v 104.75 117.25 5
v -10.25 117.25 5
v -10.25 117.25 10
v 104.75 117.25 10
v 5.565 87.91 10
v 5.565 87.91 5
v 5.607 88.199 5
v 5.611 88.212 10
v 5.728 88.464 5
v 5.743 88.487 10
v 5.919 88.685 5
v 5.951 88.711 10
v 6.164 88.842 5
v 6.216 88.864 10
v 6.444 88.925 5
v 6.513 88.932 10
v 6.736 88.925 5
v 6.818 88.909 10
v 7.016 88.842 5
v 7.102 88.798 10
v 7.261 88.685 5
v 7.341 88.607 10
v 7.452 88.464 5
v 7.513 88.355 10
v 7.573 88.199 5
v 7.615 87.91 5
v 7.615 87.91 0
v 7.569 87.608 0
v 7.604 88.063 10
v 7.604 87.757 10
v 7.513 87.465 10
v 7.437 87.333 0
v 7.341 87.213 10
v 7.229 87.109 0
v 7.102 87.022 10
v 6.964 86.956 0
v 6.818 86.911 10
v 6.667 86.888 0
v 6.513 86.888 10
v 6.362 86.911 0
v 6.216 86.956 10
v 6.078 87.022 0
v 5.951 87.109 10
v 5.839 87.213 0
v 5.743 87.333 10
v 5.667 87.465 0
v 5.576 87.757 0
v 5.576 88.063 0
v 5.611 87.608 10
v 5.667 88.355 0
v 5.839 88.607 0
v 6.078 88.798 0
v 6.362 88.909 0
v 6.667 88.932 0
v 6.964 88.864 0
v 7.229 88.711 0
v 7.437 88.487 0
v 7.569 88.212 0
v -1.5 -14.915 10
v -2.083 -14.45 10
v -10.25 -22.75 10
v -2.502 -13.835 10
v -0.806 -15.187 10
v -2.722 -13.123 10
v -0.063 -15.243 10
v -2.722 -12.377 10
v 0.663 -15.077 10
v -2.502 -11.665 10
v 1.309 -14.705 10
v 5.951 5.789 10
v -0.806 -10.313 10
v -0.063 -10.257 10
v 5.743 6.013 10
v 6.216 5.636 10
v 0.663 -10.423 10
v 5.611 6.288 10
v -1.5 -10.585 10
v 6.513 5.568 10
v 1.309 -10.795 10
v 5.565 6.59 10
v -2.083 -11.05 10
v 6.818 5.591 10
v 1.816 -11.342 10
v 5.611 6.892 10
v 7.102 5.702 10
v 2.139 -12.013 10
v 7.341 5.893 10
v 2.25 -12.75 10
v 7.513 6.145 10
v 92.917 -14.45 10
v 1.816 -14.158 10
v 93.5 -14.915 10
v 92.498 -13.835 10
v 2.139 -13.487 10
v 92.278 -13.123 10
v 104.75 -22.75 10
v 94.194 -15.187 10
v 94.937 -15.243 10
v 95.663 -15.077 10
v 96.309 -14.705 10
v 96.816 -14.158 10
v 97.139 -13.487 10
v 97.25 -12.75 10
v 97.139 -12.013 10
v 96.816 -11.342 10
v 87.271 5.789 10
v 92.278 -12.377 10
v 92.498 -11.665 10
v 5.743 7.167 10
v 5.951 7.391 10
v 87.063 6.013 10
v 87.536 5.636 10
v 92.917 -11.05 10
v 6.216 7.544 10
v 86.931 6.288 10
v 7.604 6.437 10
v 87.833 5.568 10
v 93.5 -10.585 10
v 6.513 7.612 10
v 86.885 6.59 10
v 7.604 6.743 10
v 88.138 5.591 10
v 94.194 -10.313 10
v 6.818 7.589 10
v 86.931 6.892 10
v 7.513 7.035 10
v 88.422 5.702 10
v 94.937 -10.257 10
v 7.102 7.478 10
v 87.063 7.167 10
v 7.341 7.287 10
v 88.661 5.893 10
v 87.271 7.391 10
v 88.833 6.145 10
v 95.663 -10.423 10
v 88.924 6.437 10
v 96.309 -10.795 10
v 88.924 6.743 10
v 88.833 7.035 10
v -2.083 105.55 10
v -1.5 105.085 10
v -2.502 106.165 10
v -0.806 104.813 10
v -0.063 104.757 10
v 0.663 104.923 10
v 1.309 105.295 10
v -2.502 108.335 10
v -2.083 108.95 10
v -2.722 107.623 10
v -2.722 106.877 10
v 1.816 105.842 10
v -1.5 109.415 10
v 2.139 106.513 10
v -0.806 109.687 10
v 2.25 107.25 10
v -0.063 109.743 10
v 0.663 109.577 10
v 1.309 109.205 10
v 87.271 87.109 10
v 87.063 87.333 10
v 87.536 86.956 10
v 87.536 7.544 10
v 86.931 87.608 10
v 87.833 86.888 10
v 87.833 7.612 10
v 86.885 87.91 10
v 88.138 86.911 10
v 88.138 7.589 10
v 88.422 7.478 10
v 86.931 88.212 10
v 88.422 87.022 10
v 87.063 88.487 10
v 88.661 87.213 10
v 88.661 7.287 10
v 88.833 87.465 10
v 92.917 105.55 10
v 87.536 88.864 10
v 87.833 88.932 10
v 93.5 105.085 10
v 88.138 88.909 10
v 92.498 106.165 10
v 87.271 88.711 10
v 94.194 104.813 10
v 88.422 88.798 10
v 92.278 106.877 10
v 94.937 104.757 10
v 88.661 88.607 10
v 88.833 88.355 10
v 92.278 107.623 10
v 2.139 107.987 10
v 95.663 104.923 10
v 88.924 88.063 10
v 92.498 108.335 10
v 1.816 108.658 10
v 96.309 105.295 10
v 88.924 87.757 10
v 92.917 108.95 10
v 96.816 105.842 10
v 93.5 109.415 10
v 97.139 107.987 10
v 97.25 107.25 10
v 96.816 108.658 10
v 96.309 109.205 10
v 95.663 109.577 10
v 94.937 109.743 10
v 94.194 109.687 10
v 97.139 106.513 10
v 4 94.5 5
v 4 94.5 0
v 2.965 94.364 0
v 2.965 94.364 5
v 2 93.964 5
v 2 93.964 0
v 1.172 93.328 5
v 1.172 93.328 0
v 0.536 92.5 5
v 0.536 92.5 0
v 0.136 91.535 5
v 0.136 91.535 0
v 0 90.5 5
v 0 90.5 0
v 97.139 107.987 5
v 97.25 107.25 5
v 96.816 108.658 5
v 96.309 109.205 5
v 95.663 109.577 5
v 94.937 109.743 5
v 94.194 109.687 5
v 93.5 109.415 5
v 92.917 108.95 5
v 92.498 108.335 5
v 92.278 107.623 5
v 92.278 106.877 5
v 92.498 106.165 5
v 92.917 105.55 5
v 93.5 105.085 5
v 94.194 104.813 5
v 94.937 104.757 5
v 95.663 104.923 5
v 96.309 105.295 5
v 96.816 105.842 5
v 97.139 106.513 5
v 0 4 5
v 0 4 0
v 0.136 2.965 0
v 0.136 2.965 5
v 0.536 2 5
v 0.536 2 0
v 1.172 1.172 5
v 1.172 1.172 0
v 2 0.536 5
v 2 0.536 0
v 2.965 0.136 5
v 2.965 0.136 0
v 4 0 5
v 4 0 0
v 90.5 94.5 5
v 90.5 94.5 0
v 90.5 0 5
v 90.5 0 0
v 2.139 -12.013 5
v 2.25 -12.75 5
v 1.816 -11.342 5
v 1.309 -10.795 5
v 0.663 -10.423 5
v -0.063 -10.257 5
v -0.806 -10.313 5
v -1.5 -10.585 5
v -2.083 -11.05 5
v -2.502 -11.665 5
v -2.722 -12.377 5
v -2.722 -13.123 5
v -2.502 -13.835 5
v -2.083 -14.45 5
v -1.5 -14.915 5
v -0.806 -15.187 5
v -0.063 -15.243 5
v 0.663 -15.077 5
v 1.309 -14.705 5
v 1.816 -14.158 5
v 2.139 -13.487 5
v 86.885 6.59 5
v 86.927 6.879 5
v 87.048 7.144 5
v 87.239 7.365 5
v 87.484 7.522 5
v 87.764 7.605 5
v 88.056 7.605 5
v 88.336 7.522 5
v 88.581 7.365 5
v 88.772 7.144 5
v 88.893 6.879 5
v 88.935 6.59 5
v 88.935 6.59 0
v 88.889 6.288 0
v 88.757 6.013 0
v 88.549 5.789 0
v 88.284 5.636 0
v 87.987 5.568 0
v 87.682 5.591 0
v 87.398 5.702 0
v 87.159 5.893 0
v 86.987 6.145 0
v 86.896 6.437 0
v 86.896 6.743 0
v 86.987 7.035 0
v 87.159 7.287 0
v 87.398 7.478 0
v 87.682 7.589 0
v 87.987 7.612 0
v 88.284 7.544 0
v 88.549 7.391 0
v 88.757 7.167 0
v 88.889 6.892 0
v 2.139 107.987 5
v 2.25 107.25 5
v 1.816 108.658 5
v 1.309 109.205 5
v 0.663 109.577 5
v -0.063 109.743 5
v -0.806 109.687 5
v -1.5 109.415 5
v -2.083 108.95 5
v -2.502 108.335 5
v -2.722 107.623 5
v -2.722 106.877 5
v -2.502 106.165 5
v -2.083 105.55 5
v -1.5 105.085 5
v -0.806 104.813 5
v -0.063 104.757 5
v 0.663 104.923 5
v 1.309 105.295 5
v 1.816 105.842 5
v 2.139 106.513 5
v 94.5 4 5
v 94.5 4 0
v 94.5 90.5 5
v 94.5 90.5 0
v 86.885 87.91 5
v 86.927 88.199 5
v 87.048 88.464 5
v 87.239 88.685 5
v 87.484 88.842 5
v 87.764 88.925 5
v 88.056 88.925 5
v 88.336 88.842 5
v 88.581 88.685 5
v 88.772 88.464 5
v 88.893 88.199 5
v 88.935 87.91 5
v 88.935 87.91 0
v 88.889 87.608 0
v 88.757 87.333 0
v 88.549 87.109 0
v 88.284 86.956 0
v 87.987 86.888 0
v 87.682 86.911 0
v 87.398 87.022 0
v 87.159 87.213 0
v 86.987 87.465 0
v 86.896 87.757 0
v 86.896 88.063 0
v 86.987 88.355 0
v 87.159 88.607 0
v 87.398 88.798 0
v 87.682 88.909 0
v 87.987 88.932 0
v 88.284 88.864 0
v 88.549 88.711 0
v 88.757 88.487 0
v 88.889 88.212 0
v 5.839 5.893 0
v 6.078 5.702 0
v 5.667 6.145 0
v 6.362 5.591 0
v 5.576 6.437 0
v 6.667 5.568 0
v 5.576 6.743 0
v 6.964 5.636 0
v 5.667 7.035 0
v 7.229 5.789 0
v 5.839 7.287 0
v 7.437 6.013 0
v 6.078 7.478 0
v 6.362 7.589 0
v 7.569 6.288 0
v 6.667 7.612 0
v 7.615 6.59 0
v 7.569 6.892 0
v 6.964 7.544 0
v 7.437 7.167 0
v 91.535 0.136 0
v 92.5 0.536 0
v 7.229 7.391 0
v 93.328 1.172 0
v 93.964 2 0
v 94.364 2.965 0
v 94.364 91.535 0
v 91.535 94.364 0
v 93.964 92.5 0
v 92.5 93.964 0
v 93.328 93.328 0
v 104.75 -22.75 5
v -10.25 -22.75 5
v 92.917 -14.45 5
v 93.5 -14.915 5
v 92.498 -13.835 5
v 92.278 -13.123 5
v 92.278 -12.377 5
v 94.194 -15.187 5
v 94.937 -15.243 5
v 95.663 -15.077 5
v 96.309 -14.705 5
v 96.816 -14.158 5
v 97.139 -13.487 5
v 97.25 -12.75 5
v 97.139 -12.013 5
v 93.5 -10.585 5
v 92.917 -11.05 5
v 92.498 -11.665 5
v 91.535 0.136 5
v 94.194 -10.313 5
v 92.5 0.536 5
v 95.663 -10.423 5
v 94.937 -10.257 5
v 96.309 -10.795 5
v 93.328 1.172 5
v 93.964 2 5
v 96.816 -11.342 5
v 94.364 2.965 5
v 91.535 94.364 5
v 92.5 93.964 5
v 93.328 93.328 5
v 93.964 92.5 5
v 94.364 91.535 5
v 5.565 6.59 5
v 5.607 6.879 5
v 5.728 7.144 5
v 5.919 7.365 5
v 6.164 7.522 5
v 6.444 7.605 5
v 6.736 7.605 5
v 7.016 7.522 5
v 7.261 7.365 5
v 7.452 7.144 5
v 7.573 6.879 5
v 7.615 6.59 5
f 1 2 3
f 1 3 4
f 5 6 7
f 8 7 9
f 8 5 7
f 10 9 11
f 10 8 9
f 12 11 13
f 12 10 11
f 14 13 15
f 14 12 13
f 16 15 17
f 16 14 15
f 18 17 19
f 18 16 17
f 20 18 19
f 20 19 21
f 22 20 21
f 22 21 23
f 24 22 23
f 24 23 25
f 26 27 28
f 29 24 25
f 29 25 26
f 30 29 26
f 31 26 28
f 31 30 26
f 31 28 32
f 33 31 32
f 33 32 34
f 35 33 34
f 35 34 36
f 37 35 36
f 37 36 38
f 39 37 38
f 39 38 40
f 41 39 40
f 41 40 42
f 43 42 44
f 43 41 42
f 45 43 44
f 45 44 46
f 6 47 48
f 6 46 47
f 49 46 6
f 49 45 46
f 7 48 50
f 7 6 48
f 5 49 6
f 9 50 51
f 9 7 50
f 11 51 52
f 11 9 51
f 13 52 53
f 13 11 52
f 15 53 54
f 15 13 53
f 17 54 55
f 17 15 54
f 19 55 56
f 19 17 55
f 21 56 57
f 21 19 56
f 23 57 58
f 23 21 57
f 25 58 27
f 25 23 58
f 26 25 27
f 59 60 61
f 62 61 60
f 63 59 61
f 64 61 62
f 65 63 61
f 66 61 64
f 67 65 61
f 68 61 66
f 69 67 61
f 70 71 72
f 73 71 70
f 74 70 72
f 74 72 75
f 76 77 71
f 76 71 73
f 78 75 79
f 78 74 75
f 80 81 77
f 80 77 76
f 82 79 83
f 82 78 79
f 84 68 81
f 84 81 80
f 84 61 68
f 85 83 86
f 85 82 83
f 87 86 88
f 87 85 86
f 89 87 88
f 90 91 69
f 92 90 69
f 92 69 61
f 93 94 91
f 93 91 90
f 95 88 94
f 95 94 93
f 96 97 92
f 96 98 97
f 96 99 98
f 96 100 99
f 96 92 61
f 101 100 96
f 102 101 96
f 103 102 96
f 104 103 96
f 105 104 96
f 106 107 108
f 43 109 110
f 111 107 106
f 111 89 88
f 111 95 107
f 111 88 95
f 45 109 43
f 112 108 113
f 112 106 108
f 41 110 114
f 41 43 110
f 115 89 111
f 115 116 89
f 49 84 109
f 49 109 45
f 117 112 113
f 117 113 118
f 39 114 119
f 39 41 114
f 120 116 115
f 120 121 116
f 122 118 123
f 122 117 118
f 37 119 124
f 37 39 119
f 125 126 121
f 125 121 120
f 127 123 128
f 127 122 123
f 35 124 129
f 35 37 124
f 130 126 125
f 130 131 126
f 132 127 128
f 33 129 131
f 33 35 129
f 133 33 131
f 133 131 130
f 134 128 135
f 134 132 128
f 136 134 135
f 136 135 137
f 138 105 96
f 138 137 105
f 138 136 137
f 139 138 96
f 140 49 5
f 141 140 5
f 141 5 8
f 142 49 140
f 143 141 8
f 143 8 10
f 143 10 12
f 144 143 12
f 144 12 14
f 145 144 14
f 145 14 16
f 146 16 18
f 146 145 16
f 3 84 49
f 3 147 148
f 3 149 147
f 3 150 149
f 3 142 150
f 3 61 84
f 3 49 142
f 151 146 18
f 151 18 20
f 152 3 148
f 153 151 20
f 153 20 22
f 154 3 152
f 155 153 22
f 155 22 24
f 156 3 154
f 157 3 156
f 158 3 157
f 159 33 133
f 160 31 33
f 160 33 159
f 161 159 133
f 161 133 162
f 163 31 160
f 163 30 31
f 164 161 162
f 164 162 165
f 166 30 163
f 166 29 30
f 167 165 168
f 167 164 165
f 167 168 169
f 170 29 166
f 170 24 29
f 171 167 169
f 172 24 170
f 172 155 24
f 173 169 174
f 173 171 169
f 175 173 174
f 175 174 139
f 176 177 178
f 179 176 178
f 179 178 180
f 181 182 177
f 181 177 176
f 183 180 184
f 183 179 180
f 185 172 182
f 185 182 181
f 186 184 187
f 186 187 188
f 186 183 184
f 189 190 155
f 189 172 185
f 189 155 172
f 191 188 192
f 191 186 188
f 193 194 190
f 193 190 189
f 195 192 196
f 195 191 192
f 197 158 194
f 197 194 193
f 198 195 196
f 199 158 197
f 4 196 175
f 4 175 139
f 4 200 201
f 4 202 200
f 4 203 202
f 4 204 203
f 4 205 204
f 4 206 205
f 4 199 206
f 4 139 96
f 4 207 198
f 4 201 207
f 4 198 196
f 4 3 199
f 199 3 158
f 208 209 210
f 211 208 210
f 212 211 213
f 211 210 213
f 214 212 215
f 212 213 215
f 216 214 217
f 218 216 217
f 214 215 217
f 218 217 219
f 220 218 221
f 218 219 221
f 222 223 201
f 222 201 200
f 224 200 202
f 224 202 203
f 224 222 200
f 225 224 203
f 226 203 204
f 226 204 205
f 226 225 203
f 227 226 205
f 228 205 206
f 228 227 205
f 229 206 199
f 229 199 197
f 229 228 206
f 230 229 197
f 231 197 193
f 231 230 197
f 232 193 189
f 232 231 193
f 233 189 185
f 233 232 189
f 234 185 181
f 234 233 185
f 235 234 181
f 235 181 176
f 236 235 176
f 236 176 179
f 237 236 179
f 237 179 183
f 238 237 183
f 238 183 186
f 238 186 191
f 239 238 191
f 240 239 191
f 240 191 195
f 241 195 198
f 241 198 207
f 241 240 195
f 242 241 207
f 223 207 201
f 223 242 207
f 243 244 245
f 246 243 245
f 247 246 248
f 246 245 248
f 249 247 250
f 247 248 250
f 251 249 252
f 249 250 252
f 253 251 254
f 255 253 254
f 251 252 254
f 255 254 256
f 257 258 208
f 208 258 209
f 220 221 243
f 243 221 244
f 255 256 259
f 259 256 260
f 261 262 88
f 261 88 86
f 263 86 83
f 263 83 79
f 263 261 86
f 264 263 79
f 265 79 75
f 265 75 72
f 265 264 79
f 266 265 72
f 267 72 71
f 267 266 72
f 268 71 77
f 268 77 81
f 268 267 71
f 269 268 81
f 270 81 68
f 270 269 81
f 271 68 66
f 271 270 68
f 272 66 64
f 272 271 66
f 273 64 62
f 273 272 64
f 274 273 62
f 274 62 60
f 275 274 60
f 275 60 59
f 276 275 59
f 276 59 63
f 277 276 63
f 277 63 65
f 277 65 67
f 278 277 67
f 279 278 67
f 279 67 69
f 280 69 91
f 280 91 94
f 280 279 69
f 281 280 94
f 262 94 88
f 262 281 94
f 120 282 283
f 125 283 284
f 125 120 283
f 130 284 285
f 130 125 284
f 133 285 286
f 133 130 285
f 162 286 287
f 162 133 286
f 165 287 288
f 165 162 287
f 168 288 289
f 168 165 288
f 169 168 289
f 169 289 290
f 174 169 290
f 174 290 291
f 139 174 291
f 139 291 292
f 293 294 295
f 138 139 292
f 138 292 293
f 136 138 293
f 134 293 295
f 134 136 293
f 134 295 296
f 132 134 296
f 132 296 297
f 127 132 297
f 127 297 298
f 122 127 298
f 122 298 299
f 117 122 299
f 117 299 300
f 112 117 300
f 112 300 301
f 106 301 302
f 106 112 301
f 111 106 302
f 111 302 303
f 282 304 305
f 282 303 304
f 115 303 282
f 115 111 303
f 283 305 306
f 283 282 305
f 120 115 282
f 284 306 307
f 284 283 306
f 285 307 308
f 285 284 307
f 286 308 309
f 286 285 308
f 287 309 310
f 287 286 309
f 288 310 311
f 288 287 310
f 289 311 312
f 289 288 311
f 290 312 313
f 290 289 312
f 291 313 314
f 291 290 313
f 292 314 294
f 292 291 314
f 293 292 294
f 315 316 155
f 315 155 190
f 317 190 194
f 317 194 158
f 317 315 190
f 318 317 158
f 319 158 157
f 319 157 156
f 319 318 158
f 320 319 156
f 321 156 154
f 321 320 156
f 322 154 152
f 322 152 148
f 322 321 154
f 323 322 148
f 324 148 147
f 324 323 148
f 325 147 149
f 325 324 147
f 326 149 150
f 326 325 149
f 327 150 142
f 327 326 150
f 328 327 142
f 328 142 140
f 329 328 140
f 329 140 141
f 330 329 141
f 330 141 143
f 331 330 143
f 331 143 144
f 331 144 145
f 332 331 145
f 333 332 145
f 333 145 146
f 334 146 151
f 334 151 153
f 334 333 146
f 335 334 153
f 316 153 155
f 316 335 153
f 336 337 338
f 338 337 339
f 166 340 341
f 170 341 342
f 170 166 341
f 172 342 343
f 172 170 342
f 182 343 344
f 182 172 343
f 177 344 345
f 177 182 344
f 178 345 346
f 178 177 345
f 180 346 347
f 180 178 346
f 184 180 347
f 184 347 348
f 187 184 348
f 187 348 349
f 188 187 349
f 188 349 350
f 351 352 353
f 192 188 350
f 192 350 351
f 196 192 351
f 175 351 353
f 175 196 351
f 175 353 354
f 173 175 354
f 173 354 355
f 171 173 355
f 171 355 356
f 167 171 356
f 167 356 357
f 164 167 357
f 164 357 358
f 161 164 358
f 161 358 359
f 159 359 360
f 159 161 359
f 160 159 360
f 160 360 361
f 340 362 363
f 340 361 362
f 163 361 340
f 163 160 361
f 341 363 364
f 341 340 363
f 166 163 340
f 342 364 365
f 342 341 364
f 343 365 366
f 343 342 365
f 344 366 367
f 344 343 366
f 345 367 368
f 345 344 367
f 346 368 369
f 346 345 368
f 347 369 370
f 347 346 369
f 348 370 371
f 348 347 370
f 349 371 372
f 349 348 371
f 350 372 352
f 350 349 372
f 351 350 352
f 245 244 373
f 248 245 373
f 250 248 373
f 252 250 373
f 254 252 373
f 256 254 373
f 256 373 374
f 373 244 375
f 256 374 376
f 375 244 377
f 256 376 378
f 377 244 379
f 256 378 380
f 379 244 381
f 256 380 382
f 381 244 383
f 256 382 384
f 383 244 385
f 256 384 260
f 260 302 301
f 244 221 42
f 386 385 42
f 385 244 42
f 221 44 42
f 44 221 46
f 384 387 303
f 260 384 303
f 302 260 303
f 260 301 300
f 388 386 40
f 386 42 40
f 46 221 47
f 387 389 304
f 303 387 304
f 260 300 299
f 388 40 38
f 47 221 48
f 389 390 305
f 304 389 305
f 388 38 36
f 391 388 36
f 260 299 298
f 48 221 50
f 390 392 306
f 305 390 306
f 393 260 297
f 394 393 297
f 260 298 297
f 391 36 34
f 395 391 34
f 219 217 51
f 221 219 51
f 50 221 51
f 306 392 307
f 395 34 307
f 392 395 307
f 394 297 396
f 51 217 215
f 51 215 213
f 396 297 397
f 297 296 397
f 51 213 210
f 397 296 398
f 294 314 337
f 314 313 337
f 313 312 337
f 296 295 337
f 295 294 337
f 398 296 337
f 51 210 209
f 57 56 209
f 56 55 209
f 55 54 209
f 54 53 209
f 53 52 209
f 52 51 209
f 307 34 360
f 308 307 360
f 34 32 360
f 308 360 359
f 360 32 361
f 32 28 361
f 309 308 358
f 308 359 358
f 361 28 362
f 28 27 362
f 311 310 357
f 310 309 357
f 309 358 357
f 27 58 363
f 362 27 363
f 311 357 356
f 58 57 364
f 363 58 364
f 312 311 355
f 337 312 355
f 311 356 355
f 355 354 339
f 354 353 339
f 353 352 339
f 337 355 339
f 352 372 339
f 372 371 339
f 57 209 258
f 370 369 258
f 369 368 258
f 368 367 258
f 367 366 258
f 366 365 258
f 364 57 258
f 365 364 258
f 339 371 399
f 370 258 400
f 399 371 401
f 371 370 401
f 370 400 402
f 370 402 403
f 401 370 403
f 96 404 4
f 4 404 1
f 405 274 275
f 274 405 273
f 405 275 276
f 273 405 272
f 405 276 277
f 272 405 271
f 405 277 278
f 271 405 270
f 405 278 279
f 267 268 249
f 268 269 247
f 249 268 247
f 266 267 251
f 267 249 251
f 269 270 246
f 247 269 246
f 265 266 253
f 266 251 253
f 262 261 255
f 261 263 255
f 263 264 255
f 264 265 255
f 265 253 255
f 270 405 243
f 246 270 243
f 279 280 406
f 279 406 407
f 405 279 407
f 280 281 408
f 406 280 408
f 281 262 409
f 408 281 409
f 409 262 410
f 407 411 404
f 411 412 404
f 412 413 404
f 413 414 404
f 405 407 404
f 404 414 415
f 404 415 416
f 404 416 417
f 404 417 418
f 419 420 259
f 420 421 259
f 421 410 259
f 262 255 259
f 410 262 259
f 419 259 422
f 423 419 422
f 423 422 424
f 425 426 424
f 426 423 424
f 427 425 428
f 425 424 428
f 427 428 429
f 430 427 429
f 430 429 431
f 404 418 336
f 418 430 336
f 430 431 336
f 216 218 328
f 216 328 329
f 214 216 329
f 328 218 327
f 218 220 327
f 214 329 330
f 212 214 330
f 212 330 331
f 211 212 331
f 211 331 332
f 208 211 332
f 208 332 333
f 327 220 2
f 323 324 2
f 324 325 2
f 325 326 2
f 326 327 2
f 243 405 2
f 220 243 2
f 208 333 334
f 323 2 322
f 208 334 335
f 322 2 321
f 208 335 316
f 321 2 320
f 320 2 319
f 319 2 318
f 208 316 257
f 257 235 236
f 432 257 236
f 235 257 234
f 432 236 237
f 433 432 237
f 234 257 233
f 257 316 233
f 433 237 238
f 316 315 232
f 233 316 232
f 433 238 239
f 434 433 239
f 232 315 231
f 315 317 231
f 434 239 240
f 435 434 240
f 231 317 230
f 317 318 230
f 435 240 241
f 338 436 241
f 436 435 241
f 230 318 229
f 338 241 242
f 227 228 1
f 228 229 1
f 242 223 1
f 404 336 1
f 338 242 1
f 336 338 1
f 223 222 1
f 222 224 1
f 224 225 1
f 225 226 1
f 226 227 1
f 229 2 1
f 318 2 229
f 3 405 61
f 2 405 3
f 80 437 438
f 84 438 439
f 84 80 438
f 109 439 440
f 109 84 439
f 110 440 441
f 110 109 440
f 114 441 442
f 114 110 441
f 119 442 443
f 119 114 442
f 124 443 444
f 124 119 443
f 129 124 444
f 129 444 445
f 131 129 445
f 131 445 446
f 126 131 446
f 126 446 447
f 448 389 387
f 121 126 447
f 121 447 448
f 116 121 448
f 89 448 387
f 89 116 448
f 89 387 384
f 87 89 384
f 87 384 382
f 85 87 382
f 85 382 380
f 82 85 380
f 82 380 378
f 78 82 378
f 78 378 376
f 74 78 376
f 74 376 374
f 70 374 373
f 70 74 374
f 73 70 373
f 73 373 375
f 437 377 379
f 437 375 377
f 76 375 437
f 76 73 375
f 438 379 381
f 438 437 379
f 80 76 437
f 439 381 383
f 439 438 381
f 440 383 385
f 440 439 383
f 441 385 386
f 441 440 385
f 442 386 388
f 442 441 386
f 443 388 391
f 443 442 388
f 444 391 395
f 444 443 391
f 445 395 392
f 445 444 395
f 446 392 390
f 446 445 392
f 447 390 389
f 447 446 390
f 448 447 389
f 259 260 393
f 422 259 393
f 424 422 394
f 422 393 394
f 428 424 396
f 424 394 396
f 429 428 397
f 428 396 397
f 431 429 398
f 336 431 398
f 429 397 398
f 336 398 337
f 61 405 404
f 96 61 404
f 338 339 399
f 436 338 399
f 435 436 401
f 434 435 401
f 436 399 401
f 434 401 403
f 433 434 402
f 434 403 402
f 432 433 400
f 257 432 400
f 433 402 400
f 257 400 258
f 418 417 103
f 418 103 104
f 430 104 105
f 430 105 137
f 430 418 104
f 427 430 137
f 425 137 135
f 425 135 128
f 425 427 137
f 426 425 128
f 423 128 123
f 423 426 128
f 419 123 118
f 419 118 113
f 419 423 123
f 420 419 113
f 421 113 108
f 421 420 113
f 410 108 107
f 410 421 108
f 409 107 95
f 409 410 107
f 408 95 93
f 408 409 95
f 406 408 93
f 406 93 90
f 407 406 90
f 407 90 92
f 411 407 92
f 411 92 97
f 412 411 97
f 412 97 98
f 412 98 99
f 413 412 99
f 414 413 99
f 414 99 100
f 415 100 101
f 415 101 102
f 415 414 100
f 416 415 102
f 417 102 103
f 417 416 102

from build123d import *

# Parameters (mm, degrees)
SKETCH1_R           = 1.025
BOSS_EXTRUDE1_DEPTH = 5
SKETCH2_W           = 115
SKETCH2_H           = 140
SKETCH2_R           = 2.5
BOSS_EXTRUDE2_DEPTH = 5
CUT_EXTRUDE1_START  = -10
SKETCH3_R           = 1.025
CUT_EXTRUDE1_DEPTH  = 5


with BuildPart() as part:
    # Sketch1 → Boss-Extrude1 (new body)
    with BuildSketch(Plane.XY):
        with BuildLine():
            Line((4, 0), (90.5, 0))
            ThreePointArc((90.5, 0), (93.328427125, 1.171572875), (94.5, 4))
            Line((94.5, 4), (94.5, 90.5))
            ThreePointArc((94.5, 90.5), (93.328427125, 93.328427125), (90.5, 94.5))
            Line((90.5, 94.5), (4, 94.5))
            ThreePointArc((4, 94.5), (1.171572875, 93.328427125), (0, 90.5))
            Line((0, 90.5), (0, 4))
            ThreePointArc((0, 4), (1.171572875, 1.171572875), (4, 0))
        make_face()
        with Locations((6.59, 87.91)):
            Circle(SKETCH1_R, mode=Mode.SUBTRACT)
        with Locations((87.91, 87.91)):
            Circle(SKETCH1_R, mode=Mode.SUBTRACT)
        with Locations((6.59, 6.59)):
            Circle(SKETCH1_R, mode=Mode.SUBTRACT)
        with Locations((87.91, 6.59)):
            Circle(SKETCH1_R, mode=Mode.SUBTRACT)
    extrude(amount=BOSS_EXTRUDE1_DEPTH)

    # Sketch2 → Boss-Extrude2 (add)
    with BuildSketch(Plane.XY.offset(5)):
        with Locations((47.25, 47.25)):
            Rectangle(SKETCH2_W, SKETCH2_H)
        with Locations((94.75, 107.25)):
            Circle(SKETCH2_R, mode=Mode.SUBTRACT)
        with Locations((94.75, -12.75)):
            Circle(SKETCH2_R, mode=Mode.SUBTRACT)
        with Locations((-0.25, 107.25)):
            Circle(SKETCH2_R, mode=Mode.SUBTRACT)
        with Locations((-0.25, -12.75)):
            Circle(SKETCH2_R, mode=Mode.SUBTRACT)
    extrude(amount=BOSS_EXTRUDE2_DEPTH)

    # Sketch3 → Cut-Extrude1 (cut)
    with BuildSketch(Plane(origin=(0, 0, 0), x_dir=(-1, 0, 0), z_dir=(0, 0, -1)).offset(CUT_EXTRUDE1_START)):
        with Locations((-87.91, 6.59)):
            Circle(SKETCH3_R)
        with Locations((-6.59, 6.59)):
            Circle(SKETCH3_R)
        with Locations((-6.59, 87.91)):
            Circle(SKETCH3_R)
        with Locations((-87.91, 87.91)):
            Circle(SKETCH3_R)
    extrude(amount=CUT_EXTRUDE1_DEPTH, mode=Mode.SUBTRACT)


solid = part.part
